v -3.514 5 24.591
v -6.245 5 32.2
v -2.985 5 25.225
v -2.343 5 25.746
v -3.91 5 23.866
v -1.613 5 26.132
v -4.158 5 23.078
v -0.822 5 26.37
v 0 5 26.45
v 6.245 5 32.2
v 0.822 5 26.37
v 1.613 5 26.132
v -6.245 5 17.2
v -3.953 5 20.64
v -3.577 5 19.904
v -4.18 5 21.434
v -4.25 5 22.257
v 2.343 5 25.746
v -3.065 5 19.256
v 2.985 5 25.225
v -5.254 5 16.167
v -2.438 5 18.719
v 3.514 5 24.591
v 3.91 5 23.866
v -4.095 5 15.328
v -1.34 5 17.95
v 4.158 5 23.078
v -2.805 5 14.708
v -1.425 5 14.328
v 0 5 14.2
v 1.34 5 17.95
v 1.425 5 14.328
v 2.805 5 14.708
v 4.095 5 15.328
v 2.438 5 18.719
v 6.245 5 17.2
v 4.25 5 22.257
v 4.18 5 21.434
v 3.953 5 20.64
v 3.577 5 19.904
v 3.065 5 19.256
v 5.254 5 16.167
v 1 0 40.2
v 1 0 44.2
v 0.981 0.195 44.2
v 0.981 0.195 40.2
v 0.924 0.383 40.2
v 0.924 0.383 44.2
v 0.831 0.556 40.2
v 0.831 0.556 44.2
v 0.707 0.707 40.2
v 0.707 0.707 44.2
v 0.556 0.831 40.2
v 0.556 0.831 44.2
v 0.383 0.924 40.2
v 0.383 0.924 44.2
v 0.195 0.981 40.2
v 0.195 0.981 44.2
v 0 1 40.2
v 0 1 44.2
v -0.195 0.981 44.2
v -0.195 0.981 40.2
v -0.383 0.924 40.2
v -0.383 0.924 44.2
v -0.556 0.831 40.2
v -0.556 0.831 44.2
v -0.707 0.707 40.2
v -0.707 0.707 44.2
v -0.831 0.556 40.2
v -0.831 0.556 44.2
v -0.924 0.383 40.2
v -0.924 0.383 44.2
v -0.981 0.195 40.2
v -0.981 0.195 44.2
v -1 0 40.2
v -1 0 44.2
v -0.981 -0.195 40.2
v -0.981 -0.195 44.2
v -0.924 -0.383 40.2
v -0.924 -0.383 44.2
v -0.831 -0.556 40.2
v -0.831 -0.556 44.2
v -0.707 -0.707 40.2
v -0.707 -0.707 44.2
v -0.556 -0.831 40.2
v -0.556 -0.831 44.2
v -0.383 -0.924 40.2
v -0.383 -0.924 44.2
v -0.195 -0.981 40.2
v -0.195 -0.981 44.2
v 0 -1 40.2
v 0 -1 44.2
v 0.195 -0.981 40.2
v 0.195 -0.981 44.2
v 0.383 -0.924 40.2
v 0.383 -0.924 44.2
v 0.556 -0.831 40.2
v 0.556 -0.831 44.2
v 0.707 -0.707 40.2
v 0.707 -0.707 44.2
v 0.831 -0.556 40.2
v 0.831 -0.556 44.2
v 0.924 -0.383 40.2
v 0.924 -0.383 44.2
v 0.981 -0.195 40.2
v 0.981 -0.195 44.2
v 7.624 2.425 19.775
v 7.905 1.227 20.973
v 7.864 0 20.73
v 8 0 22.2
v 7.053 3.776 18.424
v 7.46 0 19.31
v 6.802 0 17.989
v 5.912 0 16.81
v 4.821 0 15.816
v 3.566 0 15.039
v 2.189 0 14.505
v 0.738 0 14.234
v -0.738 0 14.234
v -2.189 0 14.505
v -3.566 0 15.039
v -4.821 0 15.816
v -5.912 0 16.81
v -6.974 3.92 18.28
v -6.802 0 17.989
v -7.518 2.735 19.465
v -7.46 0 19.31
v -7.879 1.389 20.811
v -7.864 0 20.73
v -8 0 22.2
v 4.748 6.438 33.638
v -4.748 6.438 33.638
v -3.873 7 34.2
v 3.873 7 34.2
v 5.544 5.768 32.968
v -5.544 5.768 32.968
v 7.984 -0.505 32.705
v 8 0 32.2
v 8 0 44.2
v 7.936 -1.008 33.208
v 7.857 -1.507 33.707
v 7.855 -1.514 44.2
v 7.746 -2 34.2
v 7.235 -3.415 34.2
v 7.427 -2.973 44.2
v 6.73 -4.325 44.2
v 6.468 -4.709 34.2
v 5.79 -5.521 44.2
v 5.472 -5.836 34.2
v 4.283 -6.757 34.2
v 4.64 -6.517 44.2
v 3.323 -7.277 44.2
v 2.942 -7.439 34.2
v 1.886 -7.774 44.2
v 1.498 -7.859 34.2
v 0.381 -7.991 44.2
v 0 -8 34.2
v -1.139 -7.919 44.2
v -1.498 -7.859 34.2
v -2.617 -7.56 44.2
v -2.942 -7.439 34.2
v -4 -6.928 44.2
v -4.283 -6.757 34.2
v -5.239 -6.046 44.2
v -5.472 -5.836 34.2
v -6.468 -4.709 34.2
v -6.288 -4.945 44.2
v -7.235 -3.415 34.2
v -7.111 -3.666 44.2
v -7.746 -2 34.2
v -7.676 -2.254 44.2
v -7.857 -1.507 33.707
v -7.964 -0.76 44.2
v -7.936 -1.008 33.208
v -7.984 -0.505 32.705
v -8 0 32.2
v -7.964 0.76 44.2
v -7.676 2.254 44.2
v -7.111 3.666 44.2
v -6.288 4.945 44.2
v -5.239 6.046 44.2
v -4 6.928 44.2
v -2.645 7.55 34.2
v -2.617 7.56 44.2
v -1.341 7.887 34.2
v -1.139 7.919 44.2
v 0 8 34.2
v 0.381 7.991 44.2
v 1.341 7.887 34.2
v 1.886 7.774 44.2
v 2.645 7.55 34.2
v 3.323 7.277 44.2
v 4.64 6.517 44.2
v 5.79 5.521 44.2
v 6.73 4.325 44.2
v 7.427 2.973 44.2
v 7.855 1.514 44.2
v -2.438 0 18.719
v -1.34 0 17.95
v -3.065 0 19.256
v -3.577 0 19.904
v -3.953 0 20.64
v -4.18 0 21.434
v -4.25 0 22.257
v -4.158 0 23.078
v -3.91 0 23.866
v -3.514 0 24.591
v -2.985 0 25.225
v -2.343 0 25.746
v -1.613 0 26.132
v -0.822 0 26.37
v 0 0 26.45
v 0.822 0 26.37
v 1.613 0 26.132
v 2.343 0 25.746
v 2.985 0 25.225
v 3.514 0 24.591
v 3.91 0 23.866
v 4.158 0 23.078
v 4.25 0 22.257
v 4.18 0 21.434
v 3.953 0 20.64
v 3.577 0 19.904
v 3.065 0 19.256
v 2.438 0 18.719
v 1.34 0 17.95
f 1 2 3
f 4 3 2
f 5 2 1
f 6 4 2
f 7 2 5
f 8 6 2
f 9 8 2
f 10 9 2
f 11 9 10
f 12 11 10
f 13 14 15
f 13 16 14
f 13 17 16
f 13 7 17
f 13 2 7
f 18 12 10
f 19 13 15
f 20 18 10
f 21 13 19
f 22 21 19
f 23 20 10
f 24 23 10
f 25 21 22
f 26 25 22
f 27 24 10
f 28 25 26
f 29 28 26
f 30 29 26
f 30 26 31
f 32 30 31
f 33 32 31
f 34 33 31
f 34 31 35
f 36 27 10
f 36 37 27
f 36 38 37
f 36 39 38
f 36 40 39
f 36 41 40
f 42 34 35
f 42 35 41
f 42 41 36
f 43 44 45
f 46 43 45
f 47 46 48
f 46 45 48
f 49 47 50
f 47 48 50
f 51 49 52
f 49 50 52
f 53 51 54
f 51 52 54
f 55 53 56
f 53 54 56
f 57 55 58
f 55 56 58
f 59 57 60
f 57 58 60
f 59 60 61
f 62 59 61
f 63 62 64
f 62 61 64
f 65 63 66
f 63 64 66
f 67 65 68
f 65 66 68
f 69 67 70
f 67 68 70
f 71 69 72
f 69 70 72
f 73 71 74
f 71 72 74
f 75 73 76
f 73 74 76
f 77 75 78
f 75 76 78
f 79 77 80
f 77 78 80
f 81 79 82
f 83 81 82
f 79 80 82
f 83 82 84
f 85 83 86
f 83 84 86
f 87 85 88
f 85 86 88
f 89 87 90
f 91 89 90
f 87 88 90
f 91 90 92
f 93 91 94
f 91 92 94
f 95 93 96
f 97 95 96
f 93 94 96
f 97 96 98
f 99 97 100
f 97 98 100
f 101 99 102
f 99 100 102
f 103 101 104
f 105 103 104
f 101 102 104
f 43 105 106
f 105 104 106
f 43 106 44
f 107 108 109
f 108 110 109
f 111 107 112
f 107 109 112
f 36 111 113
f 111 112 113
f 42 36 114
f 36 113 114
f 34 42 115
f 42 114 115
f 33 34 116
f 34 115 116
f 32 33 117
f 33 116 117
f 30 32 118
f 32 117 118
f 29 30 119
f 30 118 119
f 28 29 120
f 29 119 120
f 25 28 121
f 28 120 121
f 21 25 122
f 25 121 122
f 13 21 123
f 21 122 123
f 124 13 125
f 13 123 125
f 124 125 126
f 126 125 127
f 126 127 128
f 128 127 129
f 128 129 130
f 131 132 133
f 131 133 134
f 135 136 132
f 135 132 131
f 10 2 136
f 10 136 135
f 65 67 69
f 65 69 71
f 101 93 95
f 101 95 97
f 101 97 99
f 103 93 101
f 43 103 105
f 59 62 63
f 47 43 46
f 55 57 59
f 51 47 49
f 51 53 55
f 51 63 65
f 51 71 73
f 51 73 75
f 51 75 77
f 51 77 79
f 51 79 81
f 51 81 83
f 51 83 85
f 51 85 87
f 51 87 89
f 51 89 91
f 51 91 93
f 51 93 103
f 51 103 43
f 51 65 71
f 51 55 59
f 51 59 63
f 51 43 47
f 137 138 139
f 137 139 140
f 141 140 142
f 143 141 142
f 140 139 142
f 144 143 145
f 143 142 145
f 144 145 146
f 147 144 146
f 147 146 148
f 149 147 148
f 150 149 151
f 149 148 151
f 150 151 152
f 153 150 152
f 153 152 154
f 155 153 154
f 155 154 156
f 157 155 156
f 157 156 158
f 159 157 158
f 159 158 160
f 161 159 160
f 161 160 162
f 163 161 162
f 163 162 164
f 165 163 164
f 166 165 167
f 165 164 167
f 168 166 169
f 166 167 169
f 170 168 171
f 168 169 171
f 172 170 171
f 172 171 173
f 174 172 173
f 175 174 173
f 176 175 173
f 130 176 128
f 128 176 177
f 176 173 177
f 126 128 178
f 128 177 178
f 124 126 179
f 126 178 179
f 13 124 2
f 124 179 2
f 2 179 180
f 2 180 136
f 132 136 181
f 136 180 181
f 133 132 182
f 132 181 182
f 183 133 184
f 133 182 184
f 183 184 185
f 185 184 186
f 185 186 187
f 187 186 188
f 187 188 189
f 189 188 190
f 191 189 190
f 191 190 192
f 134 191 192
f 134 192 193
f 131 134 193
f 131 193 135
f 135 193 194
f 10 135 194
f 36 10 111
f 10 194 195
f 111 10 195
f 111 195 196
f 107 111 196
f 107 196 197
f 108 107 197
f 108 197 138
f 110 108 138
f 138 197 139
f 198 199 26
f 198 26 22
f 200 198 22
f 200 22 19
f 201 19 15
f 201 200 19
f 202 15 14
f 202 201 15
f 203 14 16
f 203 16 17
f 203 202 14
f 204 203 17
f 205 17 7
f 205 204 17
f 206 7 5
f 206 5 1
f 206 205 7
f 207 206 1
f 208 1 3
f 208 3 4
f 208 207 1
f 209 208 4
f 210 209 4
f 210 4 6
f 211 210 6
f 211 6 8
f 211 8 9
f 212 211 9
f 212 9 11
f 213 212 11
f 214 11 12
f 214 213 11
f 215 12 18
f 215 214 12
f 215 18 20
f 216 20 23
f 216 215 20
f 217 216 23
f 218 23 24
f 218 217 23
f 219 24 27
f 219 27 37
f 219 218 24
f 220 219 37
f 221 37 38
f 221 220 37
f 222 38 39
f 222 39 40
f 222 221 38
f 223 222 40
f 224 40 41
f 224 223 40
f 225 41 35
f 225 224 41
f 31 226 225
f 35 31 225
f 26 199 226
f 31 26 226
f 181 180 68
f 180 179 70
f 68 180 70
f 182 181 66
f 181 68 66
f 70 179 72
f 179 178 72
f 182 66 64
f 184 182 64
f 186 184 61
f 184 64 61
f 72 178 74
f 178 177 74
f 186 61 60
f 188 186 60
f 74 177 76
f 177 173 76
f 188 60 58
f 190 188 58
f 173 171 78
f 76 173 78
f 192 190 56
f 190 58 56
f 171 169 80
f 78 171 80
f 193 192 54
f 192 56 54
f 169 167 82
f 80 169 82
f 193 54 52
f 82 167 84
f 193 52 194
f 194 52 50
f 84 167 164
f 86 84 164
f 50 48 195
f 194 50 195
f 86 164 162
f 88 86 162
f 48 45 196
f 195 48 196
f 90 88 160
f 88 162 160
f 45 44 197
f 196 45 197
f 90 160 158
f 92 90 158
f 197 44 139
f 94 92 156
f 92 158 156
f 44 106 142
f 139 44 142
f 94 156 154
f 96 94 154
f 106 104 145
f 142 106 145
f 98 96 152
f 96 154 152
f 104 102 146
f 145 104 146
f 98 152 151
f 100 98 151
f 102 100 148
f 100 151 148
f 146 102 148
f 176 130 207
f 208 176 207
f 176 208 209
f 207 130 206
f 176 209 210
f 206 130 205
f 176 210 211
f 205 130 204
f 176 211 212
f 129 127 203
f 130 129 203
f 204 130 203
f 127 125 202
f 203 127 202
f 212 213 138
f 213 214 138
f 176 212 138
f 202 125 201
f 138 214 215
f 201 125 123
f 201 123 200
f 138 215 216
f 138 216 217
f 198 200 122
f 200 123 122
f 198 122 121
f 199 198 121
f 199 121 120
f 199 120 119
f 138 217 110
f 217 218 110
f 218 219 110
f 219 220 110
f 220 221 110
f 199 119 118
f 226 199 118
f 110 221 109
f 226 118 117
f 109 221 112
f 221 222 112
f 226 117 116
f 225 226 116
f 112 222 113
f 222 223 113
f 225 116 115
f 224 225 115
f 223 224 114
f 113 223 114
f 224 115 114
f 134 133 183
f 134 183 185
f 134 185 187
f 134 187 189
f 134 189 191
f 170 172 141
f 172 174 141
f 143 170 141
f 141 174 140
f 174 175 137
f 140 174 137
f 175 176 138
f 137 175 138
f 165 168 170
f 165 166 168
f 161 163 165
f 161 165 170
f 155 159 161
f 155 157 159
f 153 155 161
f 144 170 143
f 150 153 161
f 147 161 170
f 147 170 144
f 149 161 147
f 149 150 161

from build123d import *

# Parameters (mm, degrees)
SKETCH003_W             = 16
SKETCH003_H             = 16
PAD_DEPTH               = 10
PAD001_DEPTH            = 5
CHAMFER_SIZE            = 2
SKETCH002_R             = 15
SKETCH002_R_2           = 8
POCKET_DEPTH            = 30.001
SKETCH007_R             = 1
POCKET002_DEPTH         = 4
BODY001_PLACEMENT_ANGLE = 180


with BuildPart() as part:
    # Sketch003 → Pad (new body)
    with BuildSketch(Plane.XY):
        Rectangle(SKETCH003_W, SKETCH003_H)
    extrude(amount=PAD_DEPTH)

    # Sketch001 → Pad001 (join)
    with BuildSketch(Plane.XZ):
        with BuildLine():
            Line((8, 10), (8, 22))
            ThreePointArc((8, 22), (0, 30), (-8, 22))
            Line((-8, 22), (-8, 10))
            Line((-8, 10), (8, 10))
        make_face()
        with BuildLine():
            ThreePointArc((-2.4377, 25.481396), (0, 17.75), (2.4377, 25.481396))
            Line((1.34002, 26.25), (2.4377, 25.481396))
            Line((-1.34002, 26.25), (1.34002, 26.25))
            Line((-1.34002, 26.25), (-2.4377, 25.481396))
        make_face(mode=Mode.SUBTRACT)
    extrude(amount=PAD001_DEPTH)

    # Chamfer
    chamfer_edges = [part.edges().sort_by_distance(p)[0] for p in [
        (0, -5, 10),
        (0, 0, 10),
    ]]
    chamfer(chamfer_edges, length=CHAMFER_SIZE)

    # Sketch002 → Pocket (cut, through all)
    with BuildSketch(Plane.XY):
        Circle(SKETCH002_R)
        Circle(SKETCH002_R_2, mode=Mode.SUBTRACT)
    extrude(amount=POCKET_DEPTH, mode=Mode.SUBTRACT)

    # Sketch007 (on Face13 of Pocket) → Pocket002 (cut)
    with BuildSketch(Plane(origin=(0, 0, 0), x_dir=(1, 0, 0), z_dir=(0, 0, -1))):
        Circle(SKETCH007_R)
    extrude(amount=-POCKET002_DEPTH, mode=Mode.SUBTRACT)


with BuildPart() as part_1:
    # Body001 placement: moved
    add(part.part.moved(Location((0, 0, 44.2))).rotate(Axis((0, 0, 44.2), (1, 0, 0)), BODY001_PLACEMENT_ANGLE))


solid = part_1.part
